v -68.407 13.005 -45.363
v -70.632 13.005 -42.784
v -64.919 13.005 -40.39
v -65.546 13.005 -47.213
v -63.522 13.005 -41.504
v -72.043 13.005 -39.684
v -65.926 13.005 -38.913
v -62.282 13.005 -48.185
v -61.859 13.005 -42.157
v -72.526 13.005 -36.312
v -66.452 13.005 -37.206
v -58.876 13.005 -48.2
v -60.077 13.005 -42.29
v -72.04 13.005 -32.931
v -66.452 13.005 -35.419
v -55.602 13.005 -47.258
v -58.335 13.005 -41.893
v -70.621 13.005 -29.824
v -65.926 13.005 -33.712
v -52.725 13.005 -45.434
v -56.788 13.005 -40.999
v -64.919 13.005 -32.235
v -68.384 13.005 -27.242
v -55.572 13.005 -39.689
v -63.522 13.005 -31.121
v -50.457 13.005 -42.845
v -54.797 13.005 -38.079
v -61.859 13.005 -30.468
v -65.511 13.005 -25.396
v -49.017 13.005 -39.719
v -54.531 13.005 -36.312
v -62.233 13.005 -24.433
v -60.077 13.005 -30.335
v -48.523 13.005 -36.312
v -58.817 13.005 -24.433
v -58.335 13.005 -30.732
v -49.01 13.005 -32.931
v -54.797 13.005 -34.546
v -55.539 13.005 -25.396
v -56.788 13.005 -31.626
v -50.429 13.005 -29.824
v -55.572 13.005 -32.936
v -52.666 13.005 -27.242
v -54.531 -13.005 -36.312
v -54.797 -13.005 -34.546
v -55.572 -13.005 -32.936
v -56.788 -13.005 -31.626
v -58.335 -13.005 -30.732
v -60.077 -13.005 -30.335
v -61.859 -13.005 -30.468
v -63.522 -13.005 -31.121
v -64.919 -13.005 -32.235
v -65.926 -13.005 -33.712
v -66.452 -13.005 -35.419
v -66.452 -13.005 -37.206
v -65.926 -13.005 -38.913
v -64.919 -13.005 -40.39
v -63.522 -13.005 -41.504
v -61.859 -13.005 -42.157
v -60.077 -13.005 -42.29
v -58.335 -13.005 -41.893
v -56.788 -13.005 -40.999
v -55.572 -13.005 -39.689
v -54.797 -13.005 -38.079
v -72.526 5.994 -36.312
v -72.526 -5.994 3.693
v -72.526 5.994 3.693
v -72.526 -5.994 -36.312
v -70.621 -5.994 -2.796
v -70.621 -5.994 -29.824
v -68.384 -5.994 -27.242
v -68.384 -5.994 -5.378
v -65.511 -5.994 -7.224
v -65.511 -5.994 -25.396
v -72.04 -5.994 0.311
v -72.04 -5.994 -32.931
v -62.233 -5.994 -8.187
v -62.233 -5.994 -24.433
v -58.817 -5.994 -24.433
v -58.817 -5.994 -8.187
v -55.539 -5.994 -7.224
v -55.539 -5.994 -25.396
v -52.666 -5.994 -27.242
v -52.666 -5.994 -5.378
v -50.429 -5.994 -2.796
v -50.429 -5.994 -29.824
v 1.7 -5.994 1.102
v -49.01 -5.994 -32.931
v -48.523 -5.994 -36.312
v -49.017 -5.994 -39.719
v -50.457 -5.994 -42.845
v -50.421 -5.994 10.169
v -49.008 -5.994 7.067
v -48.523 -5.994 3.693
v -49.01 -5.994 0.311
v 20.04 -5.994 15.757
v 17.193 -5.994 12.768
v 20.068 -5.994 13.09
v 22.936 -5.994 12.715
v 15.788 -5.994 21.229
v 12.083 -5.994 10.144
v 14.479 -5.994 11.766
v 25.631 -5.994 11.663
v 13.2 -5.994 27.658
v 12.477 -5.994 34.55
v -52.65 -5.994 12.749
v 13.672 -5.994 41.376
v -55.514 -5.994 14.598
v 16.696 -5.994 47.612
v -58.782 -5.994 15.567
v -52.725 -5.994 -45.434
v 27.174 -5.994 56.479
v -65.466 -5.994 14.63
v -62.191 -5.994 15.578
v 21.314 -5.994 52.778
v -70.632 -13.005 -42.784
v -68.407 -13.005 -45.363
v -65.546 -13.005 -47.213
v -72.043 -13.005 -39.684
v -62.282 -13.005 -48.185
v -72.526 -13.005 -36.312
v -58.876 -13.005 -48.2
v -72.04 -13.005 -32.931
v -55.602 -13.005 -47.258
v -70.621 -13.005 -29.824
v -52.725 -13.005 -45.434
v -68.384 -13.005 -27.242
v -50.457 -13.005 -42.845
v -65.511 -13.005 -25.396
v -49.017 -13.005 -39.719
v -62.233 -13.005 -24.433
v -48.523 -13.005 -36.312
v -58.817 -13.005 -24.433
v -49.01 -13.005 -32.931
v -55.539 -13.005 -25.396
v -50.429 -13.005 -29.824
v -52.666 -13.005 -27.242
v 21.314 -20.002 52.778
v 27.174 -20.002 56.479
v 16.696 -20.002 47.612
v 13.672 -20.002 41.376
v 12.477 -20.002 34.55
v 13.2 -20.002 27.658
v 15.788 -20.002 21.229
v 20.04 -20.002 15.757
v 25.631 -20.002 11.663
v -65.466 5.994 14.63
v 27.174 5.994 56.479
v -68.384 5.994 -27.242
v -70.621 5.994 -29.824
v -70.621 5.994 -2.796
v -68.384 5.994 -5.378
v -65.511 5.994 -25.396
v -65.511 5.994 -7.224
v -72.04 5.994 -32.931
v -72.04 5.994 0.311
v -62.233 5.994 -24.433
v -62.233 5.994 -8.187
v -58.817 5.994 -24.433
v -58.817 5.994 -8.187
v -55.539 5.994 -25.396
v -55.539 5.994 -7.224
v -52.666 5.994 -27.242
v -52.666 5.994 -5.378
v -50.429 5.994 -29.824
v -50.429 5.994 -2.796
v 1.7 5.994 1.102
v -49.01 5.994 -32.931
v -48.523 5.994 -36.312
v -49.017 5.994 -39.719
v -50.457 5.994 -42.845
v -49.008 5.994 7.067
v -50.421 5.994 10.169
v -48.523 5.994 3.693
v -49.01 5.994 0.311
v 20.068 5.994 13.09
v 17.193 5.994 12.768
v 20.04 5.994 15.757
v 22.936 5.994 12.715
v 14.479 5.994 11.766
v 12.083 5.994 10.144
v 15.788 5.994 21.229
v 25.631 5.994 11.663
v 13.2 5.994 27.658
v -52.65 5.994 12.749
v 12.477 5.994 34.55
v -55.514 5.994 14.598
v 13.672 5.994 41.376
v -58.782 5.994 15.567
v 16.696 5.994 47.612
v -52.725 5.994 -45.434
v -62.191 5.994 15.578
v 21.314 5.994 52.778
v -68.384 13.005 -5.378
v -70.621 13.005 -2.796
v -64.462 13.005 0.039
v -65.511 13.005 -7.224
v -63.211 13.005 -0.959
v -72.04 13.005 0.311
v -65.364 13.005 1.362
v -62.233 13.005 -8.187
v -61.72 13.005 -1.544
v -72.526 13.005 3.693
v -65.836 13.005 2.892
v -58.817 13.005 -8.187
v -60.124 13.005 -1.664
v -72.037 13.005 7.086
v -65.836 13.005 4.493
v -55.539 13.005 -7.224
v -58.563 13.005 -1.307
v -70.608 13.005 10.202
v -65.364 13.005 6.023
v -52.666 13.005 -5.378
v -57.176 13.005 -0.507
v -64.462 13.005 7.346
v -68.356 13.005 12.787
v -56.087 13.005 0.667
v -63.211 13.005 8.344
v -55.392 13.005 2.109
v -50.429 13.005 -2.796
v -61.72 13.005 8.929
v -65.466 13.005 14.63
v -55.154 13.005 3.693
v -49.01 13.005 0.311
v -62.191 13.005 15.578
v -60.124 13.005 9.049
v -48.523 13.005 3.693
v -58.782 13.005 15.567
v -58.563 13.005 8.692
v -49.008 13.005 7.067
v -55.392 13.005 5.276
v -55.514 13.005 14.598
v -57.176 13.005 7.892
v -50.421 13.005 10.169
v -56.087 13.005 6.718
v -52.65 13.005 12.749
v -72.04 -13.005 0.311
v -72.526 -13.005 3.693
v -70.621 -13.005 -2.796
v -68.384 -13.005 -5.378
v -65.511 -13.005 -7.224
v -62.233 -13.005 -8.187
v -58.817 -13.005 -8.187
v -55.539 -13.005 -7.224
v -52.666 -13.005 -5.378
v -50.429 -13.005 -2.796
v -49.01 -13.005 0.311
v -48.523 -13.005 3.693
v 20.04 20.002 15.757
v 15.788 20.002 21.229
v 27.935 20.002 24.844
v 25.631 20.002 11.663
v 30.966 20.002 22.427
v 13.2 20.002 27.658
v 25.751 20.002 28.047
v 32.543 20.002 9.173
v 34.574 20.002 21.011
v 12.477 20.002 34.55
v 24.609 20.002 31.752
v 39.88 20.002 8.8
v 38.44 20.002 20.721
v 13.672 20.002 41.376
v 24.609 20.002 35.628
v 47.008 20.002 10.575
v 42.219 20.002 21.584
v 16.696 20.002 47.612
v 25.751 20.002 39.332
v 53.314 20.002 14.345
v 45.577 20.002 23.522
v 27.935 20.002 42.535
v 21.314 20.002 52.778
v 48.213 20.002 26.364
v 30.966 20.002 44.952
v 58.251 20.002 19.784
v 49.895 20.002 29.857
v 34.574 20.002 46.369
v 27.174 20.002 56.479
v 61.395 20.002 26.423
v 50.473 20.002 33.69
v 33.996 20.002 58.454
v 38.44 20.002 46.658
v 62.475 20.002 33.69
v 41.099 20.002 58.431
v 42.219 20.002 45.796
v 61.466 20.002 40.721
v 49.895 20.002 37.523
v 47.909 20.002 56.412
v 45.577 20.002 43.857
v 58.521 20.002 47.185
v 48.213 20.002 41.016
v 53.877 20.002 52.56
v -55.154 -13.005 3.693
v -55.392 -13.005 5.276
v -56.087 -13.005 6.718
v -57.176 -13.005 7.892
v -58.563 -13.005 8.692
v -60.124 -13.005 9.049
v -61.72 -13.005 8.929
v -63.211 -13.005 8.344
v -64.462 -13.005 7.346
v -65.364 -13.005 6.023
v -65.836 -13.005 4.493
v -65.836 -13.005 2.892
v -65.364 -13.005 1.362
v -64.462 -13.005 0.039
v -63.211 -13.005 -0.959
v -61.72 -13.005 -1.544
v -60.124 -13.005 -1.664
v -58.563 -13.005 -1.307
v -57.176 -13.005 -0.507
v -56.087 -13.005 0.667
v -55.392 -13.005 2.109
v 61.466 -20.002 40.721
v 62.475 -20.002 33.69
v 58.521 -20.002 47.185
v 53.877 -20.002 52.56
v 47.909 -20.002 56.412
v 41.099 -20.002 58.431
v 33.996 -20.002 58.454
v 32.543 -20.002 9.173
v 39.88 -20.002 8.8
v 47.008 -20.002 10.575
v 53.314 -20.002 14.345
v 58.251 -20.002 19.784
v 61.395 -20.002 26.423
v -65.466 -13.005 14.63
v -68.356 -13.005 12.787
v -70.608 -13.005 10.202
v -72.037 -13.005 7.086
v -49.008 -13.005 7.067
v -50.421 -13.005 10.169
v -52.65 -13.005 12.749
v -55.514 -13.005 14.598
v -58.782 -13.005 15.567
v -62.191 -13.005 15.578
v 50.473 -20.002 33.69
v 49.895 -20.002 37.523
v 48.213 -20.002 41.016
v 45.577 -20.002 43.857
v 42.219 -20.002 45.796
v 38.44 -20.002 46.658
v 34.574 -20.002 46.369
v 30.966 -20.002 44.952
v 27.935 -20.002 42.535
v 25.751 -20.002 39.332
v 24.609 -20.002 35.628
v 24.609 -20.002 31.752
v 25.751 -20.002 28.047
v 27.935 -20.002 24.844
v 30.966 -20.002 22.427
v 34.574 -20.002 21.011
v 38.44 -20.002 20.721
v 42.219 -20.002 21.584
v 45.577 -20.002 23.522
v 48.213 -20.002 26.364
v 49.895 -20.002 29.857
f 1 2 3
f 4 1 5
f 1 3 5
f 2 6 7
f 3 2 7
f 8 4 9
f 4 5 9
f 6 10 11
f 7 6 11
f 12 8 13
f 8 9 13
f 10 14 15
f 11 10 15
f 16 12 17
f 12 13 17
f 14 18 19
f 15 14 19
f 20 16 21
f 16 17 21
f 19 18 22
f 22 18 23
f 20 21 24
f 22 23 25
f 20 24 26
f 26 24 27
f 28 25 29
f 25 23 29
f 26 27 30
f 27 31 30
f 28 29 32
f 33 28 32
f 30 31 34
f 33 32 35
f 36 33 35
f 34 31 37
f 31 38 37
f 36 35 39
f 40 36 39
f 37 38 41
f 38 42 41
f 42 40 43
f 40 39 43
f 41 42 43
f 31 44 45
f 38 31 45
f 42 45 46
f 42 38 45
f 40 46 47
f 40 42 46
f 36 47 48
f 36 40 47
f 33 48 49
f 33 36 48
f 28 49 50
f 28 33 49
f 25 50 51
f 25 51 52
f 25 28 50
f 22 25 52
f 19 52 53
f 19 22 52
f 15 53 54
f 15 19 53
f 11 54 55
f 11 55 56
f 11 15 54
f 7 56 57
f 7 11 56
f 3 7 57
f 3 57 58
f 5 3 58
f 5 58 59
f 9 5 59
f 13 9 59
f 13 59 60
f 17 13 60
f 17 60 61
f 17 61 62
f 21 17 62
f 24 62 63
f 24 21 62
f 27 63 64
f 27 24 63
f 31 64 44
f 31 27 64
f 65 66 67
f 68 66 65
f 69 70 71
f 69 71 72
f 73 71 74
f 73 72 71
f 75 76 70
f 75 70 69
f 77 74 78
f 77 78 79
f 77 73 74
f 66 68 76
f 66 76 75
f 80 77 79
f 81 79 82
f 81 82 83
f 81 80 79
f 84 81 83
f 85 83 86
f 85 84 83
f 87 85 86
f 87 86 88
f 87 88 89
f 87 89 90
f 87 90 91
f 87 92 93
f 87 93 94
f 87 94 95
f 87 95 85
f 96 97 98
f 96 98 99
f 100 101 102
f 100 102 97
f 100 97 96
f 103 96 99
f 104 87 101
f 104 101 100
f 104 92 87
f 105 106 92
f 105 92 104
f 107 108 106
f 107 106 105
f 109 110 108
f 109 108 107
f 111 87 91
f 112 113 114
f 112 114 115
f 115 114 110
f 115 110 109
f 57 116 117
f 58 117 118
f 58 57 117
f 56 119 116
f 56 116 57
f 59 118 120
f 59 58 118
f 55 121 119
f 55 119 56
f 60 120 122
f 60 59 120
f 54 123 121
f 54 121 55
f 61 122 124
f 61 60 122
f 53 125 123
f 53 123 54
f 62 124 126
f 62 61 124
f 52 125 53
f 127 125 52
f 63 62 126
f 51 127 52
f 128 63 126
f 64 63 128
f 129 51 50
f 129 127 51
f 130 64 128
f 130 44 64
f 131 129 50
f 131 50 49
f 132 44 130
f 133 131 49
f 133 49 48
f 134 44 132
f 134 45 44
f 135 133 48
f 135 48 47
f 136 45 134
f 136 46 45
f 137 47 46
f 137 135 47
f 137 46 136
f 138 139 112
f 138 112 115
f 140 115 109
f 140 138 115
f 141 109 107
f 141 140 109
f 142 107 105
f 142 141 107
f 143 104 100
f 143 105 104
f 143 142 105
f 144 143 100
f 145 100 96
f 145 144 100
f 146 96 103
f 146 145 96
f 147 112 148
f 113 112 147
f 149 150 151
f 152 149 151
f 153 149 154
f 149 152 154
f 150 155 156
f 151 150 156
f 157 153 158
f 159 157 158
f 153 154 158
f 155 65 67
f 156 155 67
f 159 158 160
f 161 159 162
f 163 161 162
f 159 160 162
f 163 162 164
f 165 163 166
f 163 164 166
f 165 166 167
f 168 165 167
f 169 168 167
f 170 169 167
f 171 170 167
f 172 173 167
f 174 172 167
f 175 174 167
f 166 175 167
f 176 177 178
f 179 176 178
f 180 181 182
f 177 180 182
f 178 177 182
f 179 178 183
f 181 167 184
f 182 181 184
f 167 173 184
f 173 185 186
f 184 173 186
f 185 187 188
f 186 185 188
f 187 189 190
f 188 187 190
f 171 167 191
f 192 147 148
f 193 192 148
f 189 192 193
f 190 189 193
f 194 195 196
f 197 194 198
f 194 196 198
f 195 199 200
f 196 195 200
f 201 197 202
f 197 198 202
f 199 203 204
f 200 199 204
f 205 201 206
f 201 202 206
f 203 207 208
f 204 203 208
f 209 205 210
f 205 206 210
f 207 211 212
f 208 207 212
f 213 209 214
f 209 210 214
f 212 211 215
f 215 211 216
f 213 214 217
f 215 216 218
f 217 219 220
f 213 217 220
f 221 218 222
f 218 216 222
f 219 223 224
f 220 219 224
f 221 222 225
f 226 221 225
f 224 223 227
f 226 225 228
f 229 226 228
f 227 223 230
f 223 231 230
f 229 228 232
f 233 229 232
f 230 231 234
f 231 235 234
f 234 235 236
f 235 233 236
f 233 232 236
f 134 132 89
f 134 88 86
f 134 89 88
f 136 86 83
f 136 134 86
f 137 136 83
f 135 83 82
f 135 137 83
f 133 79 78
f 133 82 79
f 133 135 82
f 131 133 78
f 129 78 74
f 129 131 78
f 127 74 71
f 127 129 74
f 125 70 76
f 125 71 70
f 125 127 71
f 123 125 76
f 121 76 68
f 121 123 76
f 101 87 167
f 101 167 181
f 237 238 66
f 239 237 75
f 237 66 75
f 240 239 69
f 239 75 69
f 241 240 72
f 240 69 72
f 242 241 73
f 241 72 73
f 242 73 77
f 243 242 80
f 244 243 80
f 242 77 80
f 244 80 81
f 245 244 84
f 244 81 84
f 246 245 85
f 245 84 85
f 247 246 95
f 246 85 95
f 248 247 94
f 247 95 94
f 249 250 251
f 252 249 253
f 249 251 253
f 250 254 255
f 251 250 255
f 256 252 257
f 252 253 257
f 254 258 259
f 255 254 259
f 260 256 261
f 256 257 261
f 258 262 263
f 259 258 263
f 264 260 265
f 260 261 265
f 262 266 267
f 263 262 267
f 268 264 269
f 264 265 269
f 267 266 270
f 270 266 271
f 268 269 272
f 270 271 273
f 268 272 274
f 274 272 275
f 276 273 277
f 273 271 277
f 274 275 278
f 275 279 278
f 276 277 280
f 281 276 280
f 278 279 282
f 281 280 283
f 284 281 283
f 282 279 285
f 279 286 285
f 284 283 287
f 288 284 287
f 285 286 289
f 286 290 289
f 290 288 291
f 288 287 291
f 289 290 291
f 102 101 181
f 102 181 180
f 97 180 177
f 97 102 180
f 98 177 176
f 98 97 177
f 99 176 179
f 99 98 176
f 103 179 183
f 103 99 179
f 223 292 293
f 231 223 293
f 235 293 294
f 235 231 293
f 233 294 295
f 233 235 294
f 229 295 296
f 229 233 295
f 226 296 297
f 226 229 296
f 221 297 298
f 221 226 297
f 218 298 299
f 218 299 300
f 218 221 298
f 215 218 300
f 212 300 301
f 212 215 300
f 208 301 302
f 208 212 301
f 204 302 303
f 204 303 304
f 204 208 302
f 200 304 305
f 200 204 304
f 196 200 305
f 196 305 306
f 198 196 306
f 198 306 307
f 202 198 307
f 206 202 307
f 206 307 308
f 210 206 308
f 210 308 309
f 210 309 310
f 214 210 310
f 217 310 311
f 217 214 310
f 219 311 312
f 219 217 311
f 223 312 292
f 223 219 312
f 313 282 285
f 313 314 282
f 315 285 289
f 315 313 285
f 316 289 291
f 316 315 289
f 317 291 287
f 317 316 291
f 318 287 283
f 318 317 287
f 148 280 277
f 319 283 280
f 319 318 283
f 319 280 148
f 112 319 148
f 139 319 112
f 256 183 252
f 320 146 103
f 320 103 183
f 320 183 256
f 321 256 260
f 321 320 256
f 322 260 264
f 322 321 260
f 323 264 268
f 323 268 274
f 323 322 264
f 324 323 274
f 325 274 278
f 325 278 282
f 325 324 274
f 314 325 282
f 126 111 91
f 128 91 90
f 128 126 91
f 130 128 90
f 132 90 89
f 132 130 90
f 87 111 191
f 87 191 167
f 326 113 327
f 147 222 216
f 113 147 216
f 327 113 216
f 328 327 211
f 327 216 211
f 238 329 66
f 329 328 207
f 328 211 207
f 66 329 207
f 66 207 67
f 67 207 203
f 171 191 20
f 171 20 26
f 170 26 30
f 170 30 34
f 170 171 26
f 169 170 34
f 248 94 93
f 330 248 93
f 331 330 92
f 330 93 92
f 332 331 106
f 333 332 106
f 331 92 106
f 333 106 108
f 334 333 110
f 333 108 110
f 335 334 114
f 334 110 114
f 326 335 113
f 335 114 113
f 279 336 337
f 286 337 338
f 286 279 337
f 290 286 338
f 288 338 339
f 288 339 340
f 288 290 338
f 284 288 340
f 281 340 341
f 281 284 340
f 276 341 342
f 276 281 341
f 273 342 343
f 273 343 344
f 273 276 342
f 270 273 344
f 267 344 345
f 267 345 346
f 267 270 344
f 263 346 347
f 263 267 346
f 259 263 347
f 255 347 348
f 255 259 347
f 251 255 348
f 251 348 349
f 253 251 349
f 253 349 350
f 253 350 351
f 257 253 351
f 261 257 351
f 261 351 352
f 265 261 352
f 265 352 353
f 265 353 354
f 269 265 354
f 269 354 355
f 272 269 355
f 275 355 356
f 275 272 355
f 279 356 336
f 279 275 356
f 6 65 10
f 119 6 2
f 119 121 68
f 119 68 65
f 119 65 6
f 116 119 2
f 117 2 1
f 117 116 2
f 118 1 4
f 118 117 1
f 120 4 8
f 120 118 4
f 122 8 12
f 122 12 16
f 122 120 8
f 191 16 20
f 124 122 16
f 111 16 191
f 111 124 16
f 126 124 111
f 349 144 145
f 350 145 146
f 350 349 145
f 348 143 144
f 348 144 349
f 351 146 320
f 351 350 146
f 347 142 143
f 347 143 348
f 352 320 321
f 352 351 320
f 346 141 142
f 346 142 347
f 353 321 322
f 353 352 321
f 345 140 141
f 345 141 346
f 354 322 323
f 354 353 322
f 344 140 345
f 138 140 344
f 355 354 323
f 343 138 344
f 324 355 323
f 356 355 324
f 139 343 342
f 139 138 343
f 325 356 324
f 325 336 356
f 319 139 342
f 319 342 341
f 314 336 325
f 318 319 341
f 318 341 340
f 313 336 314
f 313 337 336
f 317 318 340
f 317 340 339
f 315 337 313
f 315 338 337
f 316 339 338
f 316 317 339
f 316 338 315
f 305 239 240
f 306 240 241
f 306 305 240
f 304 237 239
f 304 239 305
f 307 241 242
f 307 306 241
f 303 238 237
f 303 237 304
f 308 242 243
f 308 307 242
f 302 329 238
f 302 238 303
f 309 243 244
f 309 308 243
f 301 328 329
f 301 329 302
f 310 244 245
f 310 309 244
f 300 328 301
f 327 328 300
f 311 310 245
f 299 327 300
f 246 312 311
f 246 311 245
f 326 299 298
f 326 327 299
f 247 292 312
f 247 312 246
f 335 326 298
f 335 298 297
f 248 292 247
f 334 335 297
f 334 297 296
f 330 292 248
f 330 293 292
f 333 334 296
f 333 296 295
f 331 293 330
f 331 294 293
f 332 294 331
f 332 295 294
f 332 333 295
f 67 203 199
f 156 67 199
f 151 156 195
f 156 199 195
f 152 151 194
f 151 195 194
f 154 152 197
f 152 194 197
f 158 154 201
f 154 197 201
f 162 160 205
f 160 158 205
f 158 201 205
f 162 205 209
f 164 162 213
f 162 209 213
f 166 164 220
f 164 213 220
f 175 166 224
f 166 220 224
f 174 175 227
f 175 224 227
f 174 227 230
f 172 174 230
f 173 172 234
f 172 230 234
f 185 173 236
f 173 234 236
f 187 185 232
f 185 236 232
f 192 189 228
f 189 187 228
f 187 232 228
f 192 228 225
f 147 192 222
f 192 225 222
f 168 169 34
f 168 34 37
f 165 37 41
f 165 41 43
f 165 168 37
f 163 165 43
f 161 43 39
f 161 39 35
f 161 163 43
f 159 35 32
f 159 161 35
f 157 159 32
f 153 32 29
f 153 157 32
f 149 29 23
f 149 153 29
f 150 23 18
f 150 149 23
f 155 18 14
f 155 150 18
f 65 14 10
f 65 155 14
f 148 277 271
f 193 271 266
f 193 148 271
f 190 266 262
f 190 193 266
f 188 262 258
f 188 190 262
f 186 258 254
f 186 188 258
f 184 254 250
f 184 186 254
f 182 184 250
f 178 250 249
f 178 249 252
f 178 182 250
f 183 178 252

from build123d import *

# Parameters (mm, degrees)
F1_DEPTH = 5.9944
F0_R     = 13.0048
F2_DEPTH = 20.0025
F0_R_2   = 5.371097
F0_R_3   = 5.9944
F3_DEPTH = 13.0048


with BuildPart() as f1:
    # F0 (on Front) → F1 (new body, symmetric)
    with BuildSketch(Plane.XZ):
        with BuildLine():
            ThreePointArc((-72.526456, -36.31248), (-60.524956, -24.31098), (-48.523456, -36.31248))
            ThreePointArc((-48.523456, -36.31248), (-49.624469, -41.333973), (-52.725496, -45.434126))
            Line((-52.725496, -45.434126), (1.699654, 1.102078))
            Line((1.699654, 1.102078), (12.083406, 10.143629))
            ThreePointArc((12.083406, 10.143629), (18.620412, 13.016223), (25.631266, 11.662642))
            ThreePointArc((25.631266, 11.662642), (12.476738, 34.549967), (27.173551, 56.478828))
            Line((27.173551, 56.478828), (-65.465781, 14.629807))
            ThreePointArc((-65.465781, 14.629807), (-54.015782, 13.775509), (-48.523456, 3.69252))
            ThreePointArc((-48.523456, 3.69252), (-60.524956, -8.30898), (-72.526456, 3.69252))
            Line((-72.526456, 3.69252), (-72.526456, -36.31248))
        make_face()
    extrude(amount=F1_DEPTH, both=True)

    # F0 (on Front) → F2 (join, symmetric)
    with BuildSketch(Plane.XZ):
        with BuildLine():
            ThreePointArc((62.474544, 33.68992), (51.030745, 54.698814), (27.173551, 56.478828))
            ThreePointArc((27.173551, 56.478828), (12.476738, 34.549967), (25.631266, 11.662642))
            ThreePointArc((25.631266, 11.662642), (50.300158, 12.226998), (62.474544, 33.68992))
        make_face()
        with Locations((37.468244, 33.68992)):
            Circle(F0_R, mode=Mode.SUBTRACT)
    extrude(amount=F2_DEPTH, both=True)

    # F0 (on Front) → F3 (join, symmetric)
    with BuildSketch(Plane.XZ):
        with BuildLine():
            ThreePointArc((-65.465781, 14.629807), (-70.607945, 10.201694), (-72.526456, 3.69252))
            ThreePointArc((-72.526456, 3.69252), (-60.524956, -8.30898), (-48.523456, 3.69252))
            ThreePointArc((-48.523456, 3.69252), (-54.015782, 13.775509), (-65.465781, 14.629807))
        make_face()
        with Locations((-60.524956, 3.69252)):
            Circle(F0_R_2, mode=Mode.SUBTRACT)
        with BuildLine():
            ThreePointArc((-52.725496, -45.434126), (-49.624469, -41.333973), (-48.523456, -36.31248))
            ThreePointArc((-48.523456, -36.31248), (-60.524956, -24.31098), (-72.526456, -36.31248))
            ThreePointArc((-72.526456, -36.31248), (-65.546449, -47.212966), (-52.725496, -45.434126))
        make_face()
        with Locations((-60.524956, -36.31248)):
            Circle(F0_R_3, mode=Mode.SUBTRACT)
    extrude(amount=F3_DEPTH, both=True)


solid = f1.part
